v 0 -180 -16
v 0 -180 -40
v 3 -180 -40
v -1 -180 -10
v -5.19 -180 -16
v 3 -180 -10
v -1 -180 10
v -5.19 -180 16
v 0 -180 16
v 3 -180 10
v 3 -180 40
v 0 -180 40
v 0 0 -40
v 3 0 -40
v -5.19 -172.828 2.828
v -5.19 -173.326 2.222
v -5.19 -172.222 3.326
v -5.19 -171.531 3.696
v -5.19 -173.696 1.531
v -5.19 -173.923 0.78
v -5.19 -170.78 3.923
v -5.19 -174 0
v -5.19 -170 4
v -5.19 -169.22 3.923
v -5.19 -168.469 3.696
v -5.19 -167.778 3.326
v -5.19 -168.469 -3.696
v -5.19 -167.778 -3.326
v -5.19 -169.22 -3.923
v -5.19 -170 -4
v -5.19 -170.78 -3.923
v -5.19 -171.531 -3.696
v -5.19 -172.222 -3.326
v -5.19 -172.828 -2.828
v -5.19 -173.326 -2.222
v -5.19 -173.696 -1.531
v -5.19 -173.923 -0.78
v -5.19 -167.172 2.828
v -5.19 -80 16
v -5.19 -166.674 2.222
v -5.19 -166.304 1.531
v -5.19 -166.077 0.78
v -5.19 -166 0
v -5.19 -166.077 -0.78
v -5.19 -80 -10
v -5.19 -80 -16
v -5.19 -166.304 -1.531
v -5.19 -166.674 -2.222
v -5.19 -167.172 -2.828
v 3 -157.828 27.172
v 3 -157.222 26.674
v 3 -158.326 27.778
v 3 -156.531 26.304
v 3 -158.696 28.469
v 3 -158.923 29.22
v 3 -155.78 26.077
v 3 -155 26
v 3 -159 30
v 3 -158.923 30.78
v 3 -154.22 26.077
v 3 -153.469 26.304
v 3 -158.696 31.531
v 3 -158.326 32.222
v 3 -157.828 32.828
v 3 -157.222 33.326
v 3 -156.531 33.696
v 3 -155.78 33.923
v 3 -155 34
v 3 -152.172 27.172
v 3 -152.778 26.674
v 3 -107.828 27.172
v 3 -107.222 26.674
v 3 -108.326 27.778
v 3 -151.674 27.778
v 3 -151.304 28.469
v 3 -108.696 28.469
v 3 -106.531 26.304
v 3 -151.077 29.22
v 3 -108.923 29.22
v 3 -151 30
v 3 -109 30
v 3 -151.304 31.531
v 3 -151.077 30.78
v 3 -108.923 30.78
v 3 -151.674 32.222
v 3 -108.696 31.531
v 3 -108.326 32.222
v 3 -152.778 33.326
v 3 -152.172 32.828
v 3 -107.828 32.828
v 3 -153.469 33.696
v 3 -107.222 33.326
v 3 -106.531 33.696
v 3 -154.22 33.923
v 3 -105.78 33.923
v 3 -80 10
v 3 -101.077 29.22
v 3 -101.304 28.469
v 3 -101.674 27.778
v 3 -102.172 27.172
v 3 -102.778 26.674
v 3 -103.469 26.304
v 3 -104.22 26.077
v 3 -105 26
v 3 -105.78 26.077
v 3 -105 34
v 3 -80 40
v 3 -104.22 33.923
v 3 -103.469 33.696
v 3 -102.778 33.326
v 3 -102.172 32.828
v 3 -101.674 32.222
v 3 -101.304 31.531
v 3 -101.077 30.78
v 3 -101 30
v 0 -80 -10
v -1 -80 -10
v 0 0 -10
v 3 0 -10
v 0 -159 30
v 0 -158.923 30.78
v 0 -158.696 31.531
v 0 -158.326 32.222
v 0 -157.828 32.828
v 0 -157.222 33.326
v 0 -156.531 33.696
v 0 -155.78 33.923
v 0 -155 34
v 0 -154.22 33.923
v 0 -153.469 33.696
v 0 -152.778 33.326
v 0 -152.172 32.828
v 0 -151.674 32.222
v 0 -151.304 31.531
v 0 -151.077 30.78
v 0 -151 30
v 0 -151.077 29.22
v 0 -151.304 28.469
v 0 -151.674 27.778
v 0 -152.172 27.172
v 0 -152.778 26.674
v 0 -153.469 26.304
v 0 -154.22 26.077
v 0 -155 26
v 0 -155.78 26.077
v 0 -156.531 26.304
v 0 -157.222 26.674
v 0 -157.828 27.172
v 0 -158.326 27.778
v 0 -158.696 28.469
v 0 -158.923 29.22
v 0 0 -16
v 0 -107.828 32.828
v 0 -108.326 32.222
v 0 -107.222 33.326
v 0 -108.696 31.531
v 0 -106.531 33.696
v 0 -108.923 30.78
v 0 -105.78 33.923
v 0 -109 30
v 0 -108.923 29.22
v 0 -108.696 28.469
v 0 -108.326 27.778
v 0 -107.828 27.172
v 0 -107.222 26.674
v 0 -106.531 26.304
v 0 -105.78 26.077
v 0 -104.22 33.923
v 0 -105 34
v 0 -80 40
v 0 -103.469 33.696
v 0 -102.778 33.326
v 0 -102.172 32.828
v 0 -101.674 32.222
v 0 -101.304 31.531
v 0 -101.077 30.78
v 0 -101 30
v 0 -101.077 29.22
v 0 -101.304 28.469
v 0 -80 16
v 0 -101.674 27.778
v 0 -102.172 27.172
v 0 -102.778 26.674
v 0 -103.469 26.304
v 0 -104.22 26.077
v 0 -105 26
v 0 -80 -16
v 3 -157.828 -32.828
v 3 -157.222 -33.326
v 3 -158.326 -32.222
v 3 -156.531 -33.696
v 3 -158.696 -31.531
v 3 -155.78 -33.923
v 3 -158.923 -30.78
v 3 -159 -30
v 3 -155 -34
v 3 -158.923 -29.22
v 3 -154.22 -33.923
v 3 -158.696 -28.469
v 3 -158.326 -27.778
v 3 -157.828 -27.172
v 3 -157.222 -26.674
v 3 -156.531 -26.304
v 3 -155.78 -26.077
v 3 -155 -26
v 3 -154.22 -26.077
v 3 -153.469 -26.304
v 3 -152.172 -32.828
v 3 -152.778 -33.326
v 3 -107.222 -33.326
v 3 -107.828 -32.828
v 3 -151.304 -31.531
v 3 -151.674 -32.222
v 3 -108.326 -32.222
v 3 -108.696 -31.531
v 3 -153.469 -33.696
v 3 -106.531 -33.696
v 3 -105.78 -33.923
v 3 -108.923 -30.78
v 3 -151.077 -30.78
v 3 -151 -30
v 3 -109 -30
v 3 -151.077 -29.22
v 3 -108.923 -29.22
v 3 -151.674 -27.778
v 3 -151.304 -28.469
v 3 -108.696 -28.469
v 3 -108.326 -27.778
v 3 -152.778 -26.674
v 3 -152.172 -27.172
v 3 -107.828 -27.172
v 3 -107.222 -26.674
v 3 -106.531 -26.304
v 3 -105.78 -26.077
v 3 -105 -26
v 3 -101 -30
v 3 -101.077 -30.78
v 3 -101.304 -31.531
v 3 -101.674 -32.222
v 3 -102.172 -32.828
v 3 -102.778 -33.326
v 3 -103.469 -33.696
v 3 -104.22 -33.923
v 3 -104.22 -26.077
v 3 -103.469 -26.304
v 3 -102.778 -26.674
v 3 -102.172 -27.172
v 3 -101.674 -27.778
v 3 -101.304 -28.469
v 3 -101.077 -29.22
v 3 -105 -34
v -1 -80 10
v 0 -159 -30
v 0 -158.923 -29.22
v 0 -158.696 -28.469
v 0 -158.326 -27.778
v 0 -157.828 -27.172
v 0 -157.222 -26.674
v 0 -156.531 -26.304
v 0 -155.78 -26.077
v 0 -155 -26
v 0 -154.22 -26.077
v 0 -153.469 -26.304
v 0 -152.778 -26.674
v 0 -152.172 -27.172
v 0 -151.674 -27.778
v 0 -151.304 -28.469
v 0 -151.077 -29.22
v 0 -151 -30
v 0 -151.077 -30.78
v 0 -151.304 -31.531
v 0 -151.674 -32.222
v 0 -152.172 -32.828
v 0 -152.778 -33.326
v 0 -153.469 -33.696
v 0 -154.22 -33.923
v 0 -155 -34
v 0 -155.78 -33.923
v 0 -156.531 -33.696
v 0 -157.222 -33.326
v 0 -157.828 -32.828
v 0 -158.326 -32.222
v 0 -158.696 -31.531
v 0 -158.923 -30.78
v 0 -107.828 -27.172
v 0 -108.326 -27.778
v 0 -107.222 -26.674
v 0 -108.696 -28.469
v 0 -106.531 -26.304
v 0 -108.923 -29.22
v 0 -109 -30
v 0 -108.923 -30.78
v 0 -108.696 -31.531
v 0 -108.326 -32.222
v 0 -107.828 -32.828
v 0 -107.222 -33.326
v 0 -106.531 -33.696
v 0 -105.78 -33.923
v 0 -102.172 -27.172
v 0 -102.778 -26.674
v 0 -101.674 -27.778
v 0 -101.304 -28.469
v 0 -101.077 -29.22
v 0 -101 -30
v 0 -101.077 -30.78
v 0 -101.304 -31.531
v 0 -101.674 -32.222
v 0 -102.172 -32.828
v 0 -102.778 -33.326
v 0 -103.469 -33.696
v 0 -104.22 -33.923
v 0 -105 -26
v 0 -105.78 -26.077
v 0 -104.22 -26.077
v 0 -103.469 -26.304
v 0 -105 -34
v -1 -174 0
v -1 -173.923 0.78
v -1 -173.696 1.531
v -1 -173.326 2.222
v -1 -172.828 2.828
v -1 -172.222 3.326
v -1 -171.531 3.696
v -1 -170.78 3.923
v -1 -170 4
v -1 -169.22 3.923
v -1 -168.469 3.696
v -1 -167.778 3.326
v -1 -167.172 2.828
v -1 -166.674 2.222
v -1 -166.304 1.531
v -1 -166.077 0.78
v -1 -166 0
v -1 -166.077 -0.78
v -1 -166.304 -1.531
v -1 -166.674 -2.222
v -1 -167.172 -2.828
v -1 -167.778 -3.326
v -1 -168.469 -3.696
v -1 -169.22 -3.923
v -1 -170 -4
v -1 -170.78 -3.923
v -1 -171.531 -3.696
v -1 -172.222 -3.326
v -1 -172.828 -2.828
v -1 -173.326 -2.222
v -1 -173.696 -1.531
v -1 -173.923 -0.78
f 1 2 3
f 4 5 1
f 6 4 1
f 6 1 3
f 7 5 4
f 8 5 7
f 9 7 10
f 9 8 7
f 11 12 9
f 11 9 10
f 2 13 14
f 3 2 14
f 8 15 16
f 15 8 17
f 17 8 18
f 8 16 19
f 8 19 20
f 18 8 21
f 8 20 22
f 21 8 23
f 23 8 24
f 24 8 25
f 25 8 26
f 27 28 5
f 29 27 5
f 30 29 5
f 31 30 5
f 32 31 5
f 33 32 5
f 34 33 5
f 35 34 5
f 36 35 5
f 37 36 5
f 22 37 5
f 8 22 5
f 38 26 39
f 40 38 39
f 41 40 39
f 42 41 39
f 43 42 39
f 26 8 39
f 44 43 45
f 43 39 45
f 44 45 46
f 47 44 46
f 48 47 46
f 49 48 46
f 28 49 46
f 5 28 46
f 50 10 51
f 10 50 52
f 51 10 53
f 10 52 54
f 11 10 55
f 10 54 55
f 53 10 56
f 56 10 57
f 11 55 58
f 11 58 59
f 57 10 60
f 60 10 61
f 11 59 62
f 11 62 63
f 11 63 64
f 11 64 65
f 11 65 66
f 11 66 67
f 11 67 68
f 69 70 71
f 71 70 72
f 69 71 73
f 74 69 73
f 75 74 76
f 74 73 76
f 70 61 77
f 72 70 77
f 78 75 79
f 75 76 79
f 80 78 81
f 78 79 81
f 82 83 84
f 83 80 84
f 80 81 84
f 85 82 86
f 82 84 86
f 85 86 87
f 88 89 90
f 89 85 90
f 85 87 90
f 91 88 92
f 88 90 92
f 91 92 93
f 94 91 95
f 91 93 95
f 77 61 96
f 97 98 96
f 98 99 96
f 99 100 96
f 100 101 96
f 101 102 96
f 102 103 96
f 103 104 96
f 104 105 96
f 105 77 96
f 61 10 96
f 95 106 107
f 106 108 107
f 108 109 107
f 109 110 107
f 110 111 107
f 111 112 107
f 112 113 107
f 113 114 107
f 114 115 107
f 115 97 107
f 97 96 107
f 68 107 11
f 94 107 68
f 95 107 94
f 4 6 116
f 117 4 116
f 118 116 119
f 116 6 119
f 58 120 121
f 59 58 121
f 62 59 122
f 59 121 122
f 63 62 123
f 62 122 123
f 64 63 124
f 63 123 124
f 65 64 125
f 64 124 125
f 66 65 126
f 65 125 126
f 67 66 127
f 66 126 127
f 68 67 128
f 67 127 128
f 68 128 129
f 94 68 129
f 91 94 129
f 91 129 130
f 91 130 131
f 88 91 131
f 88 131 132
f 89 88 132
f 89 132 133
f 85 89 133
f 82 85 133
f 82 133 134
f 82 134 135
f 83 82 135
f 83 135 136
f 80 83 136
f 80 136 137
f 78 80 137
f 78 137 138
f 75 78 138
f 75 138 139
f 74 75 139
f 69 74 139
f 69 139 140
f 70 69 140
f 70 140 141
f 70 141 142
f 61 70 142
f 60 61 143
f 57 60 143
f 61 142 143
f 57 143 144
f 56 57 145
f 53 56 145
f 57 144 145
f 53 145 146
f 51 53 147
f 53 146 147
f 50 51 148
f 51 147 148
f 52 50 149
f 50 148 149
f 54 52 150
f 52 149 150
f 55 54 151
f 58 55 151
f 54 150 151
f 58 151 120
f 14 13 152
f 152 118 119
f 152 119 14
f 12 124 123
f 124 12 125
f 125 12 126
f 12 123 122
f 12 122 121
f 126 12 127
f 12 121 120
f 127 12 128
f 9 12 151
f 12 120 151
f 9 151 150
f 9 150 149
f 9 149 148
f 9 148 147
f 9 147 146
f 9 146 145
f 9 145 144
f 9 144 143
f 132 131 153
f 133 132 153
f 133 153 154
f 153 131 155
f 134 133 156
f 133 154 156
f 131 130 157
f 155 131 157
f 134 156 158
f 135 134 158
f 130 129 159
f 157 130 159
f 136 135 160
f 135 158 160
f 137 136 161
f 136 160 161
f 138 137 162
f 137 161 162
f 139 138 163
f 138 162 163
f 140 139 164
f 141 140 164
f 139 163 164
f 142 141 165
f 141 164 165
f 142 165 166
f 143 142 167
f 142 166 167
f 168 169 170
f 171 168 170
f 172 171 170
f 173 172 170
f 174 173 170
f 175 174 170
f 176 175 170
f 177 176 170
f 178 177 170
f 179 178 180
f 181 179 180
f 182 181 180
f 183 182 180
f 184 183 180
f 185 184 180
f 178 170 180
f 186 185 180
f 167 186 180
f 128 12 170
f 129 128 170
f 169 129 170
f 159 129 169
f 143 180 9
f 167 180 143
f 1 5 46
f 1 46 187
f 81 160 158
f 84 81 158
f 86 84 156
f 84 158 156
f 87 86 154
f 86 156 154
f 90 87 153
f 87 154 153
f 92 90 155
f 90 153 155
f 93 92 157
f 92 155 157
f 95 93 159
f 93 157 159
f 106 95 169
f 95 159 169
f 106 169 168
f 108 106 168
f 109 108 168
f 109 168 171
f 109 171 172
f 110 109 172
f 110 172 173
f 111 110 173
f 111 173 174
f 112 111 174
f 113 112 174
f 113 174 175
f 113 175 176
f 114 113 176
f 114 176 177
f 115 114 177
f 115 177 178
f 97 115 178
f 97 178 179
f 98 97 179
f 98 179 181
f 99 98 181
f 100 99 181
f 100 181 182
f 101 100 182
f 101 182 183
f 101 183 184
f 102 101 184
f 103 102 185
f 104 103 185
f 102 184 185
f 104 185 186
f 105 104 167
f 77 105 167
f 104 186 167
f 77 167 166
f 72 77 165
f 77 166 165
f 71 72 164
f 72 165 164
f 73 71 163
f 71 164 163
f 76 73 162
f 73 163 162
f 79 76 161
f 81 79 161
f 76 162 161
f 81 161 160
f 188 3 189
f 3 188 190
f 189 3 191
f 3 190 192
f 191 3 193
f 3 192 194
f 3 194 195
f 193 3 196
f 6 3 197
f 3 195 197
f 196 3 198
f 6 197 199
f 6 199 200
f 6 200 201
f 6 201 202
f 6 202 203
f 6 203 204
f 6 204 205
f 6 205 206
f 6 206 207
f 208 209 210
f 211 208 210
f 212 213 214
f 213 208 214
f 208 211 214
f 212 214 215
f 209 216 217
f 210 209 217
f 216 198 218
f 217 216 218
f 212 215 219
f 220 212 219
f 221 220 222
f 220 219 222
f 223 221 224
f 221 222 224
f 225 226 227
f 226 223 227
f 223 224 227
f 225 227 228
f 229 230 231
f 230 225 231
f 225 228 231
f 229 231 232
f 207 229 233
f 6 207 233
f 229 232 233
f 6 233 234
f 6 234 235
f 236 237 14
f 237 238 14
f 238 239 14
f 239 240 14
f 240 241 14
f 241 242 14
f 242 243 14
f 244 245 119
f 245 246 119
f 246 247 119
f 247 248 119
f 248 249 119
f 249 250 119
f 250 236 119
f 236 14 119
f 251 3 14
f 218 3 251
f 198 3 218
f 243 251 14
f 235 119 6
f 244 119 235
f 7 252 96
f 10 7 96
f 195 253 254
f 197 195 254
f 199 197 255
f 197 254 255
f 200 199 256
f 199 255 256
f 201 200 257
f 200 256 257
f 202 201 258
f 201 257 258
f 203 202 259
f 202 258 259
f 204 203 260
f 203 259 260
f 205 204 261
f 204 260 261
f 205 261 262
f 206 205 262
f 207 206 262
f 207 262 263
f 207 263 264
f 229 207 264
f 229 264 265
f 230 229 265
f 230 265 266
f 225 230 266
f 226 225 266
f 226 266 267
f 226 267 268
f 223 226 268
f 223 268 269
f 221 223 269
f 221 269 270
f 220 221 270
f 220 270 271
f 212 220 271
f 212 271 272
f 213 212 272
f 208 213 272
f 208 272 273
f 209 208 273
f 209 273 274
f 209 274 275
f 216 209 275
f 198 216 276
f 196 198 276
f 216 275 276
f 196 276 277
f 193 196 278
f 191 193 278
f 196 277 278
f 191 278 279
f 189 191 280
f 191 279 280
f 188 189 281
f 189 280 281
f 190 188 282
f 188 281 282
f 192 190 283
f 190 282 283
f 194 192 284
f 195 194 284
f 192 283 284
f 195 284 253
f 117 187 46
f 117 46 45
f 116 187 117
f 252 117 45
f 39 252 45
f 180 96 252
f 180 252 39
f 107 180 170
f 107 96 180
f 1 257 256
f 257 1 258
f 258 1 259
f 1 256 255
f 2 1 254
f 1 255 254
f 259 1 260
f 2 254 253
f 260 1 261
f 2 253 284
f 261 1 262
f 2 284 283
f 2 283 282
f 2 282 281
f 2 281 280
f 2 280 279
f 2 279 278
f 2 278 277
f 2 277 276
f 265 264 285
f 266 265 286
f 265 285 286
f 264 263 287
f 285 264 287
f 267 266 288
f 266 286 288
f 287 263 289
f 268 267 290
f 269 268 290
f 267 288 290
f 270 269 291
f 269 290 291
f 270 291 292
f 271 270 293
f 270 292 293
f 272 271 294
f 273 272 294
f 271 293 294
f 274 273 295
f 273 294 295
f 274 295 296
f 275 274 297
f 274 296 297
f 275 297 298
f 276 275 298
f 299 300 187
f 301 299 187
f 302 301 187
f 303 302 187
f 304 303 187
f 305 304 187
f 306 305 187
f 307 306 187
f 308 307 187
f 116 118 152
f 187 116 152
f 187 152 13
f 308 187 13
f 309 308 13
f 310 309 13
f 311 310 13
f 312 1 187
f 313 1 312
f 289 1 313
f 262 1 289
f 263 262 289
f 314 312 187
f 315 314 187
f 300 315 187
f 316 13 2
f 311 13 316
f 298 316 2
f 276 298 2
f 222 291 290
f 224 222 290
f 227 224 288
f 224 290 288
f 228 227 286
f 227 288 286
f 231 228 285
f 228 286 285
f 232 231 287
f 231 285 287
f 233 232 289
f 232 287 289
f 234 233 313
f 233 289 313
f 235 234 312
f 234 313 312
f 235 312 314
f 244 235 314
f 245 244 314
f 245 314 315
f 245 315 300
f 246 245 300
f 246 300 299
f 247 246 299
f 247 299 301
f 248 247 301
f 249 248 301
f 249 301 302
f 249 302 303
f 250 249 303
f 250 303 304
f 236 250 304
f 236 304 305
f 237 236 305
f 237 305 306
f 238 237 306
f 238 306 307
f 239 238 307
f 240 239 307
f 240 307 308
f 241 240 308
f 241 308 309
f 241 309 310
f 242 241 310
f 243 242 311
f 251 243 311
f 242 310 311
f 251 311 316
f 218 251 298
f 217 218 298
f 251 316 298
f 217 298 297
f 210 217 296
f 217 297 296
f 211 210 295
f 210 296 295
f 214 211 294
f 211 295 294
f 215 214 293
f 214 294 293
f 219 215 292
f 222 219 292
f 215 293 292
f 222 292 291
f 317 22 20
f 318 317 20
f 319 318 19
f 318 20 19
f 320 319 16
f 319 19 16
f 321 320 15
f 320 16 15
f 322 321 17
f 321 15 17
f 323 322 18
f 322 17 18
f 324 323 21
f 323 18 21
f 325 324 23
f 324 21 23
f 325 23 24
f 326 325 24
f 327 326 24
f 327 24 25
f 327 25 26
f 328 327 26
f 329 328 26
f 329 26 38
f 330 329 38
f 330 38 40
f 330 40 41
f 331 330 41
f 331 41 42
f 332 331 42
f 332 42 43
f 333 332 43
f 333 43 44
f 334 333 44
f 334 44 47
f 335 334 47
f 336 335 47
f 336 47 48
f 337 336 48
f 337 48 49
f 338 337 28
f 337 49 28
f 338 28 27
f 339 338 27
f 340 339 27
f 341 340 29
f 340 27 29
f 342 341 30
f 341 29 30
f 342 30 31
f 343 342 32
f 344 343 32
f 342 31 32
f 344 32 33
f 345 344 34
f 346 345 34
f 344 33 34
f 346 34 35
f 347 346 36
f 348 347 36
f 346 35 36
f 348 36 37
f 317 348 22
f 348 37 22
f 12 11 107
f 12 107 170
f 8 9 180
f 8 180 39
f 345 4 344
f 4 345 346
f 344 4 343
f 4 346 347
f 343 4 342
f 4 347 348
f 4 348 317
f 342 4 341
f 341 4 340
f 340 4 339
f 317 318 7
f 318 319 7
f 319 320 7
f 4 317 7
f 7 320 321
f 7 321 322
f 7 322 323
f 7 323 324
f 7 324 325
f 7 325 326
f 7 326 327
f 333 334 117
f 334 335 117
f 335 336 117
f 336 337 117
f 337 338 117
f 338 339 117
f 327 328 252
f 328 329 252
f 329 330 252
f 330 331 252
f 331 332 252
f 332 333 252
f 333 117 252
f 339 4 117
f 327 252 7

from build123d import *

# Parameters (mm, degrees)
F1_DEPTH = 180
F2_R     = 4
F3_DEPTH = 25
F4_W     = 80
F4_H     = 50
F5_DEPTH = 12.5
F6_W     = 5.1898740767
F6_H     = 6
F7_DEPTH = 80


with BuildPart() as f1:
    # F0 (on Front) → F1 (new body)
    with BuildSketch(Plane.XZ):
        Polygon((3, 40), (0, 40), (0, 16), (-5.1898740767, 16), (-5.1898740767, 0), (-1, 0), (-1, 10), (3, 10), align=None)
        Polygon((-1, 0), (-5.1898740767, 0), (-5.1898740767, -16), (0, -16), (0, -40), (3, -40), (3, -10), (-1, -10), align=None)
    extrude(amount=F1_DEPTH)

    # F2 (on face) → F3 (cut)
    with BuildSketch(Plane(origin=(-5.1898740767, 0, 0), x_dir=(0, -1, 0), z_dir=(-1, 0, 0))):
        with Locations((170, 0)):
            Circle(F2_R)
        with Locations((155, 30)):
            Circle(F2_R)
        with Locations((105, 30)):
            Circle(F2_R)
        with Locations((155, -30)):
            Circle(F2_R)
        with Locations((105, -30)):
            Circle(F2_R)
    extrude(amount=-F3_DEPTH, mode=Mode.SUBTRACT)

    # F4 (on face) → F5 (cut, symmetric)
    with BuildSketch(Plane.YZ.offset(-1)):
        with Locations((-40, 15)):
            Rectangle(F4_W, F4_H)
    extrude(amount=F5_DEPTH, both=True, mode=Mode.SUBTRACT)

    # F6 (on face) → F7 (cut)
    with BuildSketch(Plane(origin=(0, 0, 0), x_dir=(-1, 0, 0), z_dir=(0, 1, 0))):
        with Locations((2.5949370383, -13)):
            Rectangle(F6_W, F6_H)
    extrude(amount=-F7_DEPTH, mode=Mode.SUBTRACT)


solid = f1.part
